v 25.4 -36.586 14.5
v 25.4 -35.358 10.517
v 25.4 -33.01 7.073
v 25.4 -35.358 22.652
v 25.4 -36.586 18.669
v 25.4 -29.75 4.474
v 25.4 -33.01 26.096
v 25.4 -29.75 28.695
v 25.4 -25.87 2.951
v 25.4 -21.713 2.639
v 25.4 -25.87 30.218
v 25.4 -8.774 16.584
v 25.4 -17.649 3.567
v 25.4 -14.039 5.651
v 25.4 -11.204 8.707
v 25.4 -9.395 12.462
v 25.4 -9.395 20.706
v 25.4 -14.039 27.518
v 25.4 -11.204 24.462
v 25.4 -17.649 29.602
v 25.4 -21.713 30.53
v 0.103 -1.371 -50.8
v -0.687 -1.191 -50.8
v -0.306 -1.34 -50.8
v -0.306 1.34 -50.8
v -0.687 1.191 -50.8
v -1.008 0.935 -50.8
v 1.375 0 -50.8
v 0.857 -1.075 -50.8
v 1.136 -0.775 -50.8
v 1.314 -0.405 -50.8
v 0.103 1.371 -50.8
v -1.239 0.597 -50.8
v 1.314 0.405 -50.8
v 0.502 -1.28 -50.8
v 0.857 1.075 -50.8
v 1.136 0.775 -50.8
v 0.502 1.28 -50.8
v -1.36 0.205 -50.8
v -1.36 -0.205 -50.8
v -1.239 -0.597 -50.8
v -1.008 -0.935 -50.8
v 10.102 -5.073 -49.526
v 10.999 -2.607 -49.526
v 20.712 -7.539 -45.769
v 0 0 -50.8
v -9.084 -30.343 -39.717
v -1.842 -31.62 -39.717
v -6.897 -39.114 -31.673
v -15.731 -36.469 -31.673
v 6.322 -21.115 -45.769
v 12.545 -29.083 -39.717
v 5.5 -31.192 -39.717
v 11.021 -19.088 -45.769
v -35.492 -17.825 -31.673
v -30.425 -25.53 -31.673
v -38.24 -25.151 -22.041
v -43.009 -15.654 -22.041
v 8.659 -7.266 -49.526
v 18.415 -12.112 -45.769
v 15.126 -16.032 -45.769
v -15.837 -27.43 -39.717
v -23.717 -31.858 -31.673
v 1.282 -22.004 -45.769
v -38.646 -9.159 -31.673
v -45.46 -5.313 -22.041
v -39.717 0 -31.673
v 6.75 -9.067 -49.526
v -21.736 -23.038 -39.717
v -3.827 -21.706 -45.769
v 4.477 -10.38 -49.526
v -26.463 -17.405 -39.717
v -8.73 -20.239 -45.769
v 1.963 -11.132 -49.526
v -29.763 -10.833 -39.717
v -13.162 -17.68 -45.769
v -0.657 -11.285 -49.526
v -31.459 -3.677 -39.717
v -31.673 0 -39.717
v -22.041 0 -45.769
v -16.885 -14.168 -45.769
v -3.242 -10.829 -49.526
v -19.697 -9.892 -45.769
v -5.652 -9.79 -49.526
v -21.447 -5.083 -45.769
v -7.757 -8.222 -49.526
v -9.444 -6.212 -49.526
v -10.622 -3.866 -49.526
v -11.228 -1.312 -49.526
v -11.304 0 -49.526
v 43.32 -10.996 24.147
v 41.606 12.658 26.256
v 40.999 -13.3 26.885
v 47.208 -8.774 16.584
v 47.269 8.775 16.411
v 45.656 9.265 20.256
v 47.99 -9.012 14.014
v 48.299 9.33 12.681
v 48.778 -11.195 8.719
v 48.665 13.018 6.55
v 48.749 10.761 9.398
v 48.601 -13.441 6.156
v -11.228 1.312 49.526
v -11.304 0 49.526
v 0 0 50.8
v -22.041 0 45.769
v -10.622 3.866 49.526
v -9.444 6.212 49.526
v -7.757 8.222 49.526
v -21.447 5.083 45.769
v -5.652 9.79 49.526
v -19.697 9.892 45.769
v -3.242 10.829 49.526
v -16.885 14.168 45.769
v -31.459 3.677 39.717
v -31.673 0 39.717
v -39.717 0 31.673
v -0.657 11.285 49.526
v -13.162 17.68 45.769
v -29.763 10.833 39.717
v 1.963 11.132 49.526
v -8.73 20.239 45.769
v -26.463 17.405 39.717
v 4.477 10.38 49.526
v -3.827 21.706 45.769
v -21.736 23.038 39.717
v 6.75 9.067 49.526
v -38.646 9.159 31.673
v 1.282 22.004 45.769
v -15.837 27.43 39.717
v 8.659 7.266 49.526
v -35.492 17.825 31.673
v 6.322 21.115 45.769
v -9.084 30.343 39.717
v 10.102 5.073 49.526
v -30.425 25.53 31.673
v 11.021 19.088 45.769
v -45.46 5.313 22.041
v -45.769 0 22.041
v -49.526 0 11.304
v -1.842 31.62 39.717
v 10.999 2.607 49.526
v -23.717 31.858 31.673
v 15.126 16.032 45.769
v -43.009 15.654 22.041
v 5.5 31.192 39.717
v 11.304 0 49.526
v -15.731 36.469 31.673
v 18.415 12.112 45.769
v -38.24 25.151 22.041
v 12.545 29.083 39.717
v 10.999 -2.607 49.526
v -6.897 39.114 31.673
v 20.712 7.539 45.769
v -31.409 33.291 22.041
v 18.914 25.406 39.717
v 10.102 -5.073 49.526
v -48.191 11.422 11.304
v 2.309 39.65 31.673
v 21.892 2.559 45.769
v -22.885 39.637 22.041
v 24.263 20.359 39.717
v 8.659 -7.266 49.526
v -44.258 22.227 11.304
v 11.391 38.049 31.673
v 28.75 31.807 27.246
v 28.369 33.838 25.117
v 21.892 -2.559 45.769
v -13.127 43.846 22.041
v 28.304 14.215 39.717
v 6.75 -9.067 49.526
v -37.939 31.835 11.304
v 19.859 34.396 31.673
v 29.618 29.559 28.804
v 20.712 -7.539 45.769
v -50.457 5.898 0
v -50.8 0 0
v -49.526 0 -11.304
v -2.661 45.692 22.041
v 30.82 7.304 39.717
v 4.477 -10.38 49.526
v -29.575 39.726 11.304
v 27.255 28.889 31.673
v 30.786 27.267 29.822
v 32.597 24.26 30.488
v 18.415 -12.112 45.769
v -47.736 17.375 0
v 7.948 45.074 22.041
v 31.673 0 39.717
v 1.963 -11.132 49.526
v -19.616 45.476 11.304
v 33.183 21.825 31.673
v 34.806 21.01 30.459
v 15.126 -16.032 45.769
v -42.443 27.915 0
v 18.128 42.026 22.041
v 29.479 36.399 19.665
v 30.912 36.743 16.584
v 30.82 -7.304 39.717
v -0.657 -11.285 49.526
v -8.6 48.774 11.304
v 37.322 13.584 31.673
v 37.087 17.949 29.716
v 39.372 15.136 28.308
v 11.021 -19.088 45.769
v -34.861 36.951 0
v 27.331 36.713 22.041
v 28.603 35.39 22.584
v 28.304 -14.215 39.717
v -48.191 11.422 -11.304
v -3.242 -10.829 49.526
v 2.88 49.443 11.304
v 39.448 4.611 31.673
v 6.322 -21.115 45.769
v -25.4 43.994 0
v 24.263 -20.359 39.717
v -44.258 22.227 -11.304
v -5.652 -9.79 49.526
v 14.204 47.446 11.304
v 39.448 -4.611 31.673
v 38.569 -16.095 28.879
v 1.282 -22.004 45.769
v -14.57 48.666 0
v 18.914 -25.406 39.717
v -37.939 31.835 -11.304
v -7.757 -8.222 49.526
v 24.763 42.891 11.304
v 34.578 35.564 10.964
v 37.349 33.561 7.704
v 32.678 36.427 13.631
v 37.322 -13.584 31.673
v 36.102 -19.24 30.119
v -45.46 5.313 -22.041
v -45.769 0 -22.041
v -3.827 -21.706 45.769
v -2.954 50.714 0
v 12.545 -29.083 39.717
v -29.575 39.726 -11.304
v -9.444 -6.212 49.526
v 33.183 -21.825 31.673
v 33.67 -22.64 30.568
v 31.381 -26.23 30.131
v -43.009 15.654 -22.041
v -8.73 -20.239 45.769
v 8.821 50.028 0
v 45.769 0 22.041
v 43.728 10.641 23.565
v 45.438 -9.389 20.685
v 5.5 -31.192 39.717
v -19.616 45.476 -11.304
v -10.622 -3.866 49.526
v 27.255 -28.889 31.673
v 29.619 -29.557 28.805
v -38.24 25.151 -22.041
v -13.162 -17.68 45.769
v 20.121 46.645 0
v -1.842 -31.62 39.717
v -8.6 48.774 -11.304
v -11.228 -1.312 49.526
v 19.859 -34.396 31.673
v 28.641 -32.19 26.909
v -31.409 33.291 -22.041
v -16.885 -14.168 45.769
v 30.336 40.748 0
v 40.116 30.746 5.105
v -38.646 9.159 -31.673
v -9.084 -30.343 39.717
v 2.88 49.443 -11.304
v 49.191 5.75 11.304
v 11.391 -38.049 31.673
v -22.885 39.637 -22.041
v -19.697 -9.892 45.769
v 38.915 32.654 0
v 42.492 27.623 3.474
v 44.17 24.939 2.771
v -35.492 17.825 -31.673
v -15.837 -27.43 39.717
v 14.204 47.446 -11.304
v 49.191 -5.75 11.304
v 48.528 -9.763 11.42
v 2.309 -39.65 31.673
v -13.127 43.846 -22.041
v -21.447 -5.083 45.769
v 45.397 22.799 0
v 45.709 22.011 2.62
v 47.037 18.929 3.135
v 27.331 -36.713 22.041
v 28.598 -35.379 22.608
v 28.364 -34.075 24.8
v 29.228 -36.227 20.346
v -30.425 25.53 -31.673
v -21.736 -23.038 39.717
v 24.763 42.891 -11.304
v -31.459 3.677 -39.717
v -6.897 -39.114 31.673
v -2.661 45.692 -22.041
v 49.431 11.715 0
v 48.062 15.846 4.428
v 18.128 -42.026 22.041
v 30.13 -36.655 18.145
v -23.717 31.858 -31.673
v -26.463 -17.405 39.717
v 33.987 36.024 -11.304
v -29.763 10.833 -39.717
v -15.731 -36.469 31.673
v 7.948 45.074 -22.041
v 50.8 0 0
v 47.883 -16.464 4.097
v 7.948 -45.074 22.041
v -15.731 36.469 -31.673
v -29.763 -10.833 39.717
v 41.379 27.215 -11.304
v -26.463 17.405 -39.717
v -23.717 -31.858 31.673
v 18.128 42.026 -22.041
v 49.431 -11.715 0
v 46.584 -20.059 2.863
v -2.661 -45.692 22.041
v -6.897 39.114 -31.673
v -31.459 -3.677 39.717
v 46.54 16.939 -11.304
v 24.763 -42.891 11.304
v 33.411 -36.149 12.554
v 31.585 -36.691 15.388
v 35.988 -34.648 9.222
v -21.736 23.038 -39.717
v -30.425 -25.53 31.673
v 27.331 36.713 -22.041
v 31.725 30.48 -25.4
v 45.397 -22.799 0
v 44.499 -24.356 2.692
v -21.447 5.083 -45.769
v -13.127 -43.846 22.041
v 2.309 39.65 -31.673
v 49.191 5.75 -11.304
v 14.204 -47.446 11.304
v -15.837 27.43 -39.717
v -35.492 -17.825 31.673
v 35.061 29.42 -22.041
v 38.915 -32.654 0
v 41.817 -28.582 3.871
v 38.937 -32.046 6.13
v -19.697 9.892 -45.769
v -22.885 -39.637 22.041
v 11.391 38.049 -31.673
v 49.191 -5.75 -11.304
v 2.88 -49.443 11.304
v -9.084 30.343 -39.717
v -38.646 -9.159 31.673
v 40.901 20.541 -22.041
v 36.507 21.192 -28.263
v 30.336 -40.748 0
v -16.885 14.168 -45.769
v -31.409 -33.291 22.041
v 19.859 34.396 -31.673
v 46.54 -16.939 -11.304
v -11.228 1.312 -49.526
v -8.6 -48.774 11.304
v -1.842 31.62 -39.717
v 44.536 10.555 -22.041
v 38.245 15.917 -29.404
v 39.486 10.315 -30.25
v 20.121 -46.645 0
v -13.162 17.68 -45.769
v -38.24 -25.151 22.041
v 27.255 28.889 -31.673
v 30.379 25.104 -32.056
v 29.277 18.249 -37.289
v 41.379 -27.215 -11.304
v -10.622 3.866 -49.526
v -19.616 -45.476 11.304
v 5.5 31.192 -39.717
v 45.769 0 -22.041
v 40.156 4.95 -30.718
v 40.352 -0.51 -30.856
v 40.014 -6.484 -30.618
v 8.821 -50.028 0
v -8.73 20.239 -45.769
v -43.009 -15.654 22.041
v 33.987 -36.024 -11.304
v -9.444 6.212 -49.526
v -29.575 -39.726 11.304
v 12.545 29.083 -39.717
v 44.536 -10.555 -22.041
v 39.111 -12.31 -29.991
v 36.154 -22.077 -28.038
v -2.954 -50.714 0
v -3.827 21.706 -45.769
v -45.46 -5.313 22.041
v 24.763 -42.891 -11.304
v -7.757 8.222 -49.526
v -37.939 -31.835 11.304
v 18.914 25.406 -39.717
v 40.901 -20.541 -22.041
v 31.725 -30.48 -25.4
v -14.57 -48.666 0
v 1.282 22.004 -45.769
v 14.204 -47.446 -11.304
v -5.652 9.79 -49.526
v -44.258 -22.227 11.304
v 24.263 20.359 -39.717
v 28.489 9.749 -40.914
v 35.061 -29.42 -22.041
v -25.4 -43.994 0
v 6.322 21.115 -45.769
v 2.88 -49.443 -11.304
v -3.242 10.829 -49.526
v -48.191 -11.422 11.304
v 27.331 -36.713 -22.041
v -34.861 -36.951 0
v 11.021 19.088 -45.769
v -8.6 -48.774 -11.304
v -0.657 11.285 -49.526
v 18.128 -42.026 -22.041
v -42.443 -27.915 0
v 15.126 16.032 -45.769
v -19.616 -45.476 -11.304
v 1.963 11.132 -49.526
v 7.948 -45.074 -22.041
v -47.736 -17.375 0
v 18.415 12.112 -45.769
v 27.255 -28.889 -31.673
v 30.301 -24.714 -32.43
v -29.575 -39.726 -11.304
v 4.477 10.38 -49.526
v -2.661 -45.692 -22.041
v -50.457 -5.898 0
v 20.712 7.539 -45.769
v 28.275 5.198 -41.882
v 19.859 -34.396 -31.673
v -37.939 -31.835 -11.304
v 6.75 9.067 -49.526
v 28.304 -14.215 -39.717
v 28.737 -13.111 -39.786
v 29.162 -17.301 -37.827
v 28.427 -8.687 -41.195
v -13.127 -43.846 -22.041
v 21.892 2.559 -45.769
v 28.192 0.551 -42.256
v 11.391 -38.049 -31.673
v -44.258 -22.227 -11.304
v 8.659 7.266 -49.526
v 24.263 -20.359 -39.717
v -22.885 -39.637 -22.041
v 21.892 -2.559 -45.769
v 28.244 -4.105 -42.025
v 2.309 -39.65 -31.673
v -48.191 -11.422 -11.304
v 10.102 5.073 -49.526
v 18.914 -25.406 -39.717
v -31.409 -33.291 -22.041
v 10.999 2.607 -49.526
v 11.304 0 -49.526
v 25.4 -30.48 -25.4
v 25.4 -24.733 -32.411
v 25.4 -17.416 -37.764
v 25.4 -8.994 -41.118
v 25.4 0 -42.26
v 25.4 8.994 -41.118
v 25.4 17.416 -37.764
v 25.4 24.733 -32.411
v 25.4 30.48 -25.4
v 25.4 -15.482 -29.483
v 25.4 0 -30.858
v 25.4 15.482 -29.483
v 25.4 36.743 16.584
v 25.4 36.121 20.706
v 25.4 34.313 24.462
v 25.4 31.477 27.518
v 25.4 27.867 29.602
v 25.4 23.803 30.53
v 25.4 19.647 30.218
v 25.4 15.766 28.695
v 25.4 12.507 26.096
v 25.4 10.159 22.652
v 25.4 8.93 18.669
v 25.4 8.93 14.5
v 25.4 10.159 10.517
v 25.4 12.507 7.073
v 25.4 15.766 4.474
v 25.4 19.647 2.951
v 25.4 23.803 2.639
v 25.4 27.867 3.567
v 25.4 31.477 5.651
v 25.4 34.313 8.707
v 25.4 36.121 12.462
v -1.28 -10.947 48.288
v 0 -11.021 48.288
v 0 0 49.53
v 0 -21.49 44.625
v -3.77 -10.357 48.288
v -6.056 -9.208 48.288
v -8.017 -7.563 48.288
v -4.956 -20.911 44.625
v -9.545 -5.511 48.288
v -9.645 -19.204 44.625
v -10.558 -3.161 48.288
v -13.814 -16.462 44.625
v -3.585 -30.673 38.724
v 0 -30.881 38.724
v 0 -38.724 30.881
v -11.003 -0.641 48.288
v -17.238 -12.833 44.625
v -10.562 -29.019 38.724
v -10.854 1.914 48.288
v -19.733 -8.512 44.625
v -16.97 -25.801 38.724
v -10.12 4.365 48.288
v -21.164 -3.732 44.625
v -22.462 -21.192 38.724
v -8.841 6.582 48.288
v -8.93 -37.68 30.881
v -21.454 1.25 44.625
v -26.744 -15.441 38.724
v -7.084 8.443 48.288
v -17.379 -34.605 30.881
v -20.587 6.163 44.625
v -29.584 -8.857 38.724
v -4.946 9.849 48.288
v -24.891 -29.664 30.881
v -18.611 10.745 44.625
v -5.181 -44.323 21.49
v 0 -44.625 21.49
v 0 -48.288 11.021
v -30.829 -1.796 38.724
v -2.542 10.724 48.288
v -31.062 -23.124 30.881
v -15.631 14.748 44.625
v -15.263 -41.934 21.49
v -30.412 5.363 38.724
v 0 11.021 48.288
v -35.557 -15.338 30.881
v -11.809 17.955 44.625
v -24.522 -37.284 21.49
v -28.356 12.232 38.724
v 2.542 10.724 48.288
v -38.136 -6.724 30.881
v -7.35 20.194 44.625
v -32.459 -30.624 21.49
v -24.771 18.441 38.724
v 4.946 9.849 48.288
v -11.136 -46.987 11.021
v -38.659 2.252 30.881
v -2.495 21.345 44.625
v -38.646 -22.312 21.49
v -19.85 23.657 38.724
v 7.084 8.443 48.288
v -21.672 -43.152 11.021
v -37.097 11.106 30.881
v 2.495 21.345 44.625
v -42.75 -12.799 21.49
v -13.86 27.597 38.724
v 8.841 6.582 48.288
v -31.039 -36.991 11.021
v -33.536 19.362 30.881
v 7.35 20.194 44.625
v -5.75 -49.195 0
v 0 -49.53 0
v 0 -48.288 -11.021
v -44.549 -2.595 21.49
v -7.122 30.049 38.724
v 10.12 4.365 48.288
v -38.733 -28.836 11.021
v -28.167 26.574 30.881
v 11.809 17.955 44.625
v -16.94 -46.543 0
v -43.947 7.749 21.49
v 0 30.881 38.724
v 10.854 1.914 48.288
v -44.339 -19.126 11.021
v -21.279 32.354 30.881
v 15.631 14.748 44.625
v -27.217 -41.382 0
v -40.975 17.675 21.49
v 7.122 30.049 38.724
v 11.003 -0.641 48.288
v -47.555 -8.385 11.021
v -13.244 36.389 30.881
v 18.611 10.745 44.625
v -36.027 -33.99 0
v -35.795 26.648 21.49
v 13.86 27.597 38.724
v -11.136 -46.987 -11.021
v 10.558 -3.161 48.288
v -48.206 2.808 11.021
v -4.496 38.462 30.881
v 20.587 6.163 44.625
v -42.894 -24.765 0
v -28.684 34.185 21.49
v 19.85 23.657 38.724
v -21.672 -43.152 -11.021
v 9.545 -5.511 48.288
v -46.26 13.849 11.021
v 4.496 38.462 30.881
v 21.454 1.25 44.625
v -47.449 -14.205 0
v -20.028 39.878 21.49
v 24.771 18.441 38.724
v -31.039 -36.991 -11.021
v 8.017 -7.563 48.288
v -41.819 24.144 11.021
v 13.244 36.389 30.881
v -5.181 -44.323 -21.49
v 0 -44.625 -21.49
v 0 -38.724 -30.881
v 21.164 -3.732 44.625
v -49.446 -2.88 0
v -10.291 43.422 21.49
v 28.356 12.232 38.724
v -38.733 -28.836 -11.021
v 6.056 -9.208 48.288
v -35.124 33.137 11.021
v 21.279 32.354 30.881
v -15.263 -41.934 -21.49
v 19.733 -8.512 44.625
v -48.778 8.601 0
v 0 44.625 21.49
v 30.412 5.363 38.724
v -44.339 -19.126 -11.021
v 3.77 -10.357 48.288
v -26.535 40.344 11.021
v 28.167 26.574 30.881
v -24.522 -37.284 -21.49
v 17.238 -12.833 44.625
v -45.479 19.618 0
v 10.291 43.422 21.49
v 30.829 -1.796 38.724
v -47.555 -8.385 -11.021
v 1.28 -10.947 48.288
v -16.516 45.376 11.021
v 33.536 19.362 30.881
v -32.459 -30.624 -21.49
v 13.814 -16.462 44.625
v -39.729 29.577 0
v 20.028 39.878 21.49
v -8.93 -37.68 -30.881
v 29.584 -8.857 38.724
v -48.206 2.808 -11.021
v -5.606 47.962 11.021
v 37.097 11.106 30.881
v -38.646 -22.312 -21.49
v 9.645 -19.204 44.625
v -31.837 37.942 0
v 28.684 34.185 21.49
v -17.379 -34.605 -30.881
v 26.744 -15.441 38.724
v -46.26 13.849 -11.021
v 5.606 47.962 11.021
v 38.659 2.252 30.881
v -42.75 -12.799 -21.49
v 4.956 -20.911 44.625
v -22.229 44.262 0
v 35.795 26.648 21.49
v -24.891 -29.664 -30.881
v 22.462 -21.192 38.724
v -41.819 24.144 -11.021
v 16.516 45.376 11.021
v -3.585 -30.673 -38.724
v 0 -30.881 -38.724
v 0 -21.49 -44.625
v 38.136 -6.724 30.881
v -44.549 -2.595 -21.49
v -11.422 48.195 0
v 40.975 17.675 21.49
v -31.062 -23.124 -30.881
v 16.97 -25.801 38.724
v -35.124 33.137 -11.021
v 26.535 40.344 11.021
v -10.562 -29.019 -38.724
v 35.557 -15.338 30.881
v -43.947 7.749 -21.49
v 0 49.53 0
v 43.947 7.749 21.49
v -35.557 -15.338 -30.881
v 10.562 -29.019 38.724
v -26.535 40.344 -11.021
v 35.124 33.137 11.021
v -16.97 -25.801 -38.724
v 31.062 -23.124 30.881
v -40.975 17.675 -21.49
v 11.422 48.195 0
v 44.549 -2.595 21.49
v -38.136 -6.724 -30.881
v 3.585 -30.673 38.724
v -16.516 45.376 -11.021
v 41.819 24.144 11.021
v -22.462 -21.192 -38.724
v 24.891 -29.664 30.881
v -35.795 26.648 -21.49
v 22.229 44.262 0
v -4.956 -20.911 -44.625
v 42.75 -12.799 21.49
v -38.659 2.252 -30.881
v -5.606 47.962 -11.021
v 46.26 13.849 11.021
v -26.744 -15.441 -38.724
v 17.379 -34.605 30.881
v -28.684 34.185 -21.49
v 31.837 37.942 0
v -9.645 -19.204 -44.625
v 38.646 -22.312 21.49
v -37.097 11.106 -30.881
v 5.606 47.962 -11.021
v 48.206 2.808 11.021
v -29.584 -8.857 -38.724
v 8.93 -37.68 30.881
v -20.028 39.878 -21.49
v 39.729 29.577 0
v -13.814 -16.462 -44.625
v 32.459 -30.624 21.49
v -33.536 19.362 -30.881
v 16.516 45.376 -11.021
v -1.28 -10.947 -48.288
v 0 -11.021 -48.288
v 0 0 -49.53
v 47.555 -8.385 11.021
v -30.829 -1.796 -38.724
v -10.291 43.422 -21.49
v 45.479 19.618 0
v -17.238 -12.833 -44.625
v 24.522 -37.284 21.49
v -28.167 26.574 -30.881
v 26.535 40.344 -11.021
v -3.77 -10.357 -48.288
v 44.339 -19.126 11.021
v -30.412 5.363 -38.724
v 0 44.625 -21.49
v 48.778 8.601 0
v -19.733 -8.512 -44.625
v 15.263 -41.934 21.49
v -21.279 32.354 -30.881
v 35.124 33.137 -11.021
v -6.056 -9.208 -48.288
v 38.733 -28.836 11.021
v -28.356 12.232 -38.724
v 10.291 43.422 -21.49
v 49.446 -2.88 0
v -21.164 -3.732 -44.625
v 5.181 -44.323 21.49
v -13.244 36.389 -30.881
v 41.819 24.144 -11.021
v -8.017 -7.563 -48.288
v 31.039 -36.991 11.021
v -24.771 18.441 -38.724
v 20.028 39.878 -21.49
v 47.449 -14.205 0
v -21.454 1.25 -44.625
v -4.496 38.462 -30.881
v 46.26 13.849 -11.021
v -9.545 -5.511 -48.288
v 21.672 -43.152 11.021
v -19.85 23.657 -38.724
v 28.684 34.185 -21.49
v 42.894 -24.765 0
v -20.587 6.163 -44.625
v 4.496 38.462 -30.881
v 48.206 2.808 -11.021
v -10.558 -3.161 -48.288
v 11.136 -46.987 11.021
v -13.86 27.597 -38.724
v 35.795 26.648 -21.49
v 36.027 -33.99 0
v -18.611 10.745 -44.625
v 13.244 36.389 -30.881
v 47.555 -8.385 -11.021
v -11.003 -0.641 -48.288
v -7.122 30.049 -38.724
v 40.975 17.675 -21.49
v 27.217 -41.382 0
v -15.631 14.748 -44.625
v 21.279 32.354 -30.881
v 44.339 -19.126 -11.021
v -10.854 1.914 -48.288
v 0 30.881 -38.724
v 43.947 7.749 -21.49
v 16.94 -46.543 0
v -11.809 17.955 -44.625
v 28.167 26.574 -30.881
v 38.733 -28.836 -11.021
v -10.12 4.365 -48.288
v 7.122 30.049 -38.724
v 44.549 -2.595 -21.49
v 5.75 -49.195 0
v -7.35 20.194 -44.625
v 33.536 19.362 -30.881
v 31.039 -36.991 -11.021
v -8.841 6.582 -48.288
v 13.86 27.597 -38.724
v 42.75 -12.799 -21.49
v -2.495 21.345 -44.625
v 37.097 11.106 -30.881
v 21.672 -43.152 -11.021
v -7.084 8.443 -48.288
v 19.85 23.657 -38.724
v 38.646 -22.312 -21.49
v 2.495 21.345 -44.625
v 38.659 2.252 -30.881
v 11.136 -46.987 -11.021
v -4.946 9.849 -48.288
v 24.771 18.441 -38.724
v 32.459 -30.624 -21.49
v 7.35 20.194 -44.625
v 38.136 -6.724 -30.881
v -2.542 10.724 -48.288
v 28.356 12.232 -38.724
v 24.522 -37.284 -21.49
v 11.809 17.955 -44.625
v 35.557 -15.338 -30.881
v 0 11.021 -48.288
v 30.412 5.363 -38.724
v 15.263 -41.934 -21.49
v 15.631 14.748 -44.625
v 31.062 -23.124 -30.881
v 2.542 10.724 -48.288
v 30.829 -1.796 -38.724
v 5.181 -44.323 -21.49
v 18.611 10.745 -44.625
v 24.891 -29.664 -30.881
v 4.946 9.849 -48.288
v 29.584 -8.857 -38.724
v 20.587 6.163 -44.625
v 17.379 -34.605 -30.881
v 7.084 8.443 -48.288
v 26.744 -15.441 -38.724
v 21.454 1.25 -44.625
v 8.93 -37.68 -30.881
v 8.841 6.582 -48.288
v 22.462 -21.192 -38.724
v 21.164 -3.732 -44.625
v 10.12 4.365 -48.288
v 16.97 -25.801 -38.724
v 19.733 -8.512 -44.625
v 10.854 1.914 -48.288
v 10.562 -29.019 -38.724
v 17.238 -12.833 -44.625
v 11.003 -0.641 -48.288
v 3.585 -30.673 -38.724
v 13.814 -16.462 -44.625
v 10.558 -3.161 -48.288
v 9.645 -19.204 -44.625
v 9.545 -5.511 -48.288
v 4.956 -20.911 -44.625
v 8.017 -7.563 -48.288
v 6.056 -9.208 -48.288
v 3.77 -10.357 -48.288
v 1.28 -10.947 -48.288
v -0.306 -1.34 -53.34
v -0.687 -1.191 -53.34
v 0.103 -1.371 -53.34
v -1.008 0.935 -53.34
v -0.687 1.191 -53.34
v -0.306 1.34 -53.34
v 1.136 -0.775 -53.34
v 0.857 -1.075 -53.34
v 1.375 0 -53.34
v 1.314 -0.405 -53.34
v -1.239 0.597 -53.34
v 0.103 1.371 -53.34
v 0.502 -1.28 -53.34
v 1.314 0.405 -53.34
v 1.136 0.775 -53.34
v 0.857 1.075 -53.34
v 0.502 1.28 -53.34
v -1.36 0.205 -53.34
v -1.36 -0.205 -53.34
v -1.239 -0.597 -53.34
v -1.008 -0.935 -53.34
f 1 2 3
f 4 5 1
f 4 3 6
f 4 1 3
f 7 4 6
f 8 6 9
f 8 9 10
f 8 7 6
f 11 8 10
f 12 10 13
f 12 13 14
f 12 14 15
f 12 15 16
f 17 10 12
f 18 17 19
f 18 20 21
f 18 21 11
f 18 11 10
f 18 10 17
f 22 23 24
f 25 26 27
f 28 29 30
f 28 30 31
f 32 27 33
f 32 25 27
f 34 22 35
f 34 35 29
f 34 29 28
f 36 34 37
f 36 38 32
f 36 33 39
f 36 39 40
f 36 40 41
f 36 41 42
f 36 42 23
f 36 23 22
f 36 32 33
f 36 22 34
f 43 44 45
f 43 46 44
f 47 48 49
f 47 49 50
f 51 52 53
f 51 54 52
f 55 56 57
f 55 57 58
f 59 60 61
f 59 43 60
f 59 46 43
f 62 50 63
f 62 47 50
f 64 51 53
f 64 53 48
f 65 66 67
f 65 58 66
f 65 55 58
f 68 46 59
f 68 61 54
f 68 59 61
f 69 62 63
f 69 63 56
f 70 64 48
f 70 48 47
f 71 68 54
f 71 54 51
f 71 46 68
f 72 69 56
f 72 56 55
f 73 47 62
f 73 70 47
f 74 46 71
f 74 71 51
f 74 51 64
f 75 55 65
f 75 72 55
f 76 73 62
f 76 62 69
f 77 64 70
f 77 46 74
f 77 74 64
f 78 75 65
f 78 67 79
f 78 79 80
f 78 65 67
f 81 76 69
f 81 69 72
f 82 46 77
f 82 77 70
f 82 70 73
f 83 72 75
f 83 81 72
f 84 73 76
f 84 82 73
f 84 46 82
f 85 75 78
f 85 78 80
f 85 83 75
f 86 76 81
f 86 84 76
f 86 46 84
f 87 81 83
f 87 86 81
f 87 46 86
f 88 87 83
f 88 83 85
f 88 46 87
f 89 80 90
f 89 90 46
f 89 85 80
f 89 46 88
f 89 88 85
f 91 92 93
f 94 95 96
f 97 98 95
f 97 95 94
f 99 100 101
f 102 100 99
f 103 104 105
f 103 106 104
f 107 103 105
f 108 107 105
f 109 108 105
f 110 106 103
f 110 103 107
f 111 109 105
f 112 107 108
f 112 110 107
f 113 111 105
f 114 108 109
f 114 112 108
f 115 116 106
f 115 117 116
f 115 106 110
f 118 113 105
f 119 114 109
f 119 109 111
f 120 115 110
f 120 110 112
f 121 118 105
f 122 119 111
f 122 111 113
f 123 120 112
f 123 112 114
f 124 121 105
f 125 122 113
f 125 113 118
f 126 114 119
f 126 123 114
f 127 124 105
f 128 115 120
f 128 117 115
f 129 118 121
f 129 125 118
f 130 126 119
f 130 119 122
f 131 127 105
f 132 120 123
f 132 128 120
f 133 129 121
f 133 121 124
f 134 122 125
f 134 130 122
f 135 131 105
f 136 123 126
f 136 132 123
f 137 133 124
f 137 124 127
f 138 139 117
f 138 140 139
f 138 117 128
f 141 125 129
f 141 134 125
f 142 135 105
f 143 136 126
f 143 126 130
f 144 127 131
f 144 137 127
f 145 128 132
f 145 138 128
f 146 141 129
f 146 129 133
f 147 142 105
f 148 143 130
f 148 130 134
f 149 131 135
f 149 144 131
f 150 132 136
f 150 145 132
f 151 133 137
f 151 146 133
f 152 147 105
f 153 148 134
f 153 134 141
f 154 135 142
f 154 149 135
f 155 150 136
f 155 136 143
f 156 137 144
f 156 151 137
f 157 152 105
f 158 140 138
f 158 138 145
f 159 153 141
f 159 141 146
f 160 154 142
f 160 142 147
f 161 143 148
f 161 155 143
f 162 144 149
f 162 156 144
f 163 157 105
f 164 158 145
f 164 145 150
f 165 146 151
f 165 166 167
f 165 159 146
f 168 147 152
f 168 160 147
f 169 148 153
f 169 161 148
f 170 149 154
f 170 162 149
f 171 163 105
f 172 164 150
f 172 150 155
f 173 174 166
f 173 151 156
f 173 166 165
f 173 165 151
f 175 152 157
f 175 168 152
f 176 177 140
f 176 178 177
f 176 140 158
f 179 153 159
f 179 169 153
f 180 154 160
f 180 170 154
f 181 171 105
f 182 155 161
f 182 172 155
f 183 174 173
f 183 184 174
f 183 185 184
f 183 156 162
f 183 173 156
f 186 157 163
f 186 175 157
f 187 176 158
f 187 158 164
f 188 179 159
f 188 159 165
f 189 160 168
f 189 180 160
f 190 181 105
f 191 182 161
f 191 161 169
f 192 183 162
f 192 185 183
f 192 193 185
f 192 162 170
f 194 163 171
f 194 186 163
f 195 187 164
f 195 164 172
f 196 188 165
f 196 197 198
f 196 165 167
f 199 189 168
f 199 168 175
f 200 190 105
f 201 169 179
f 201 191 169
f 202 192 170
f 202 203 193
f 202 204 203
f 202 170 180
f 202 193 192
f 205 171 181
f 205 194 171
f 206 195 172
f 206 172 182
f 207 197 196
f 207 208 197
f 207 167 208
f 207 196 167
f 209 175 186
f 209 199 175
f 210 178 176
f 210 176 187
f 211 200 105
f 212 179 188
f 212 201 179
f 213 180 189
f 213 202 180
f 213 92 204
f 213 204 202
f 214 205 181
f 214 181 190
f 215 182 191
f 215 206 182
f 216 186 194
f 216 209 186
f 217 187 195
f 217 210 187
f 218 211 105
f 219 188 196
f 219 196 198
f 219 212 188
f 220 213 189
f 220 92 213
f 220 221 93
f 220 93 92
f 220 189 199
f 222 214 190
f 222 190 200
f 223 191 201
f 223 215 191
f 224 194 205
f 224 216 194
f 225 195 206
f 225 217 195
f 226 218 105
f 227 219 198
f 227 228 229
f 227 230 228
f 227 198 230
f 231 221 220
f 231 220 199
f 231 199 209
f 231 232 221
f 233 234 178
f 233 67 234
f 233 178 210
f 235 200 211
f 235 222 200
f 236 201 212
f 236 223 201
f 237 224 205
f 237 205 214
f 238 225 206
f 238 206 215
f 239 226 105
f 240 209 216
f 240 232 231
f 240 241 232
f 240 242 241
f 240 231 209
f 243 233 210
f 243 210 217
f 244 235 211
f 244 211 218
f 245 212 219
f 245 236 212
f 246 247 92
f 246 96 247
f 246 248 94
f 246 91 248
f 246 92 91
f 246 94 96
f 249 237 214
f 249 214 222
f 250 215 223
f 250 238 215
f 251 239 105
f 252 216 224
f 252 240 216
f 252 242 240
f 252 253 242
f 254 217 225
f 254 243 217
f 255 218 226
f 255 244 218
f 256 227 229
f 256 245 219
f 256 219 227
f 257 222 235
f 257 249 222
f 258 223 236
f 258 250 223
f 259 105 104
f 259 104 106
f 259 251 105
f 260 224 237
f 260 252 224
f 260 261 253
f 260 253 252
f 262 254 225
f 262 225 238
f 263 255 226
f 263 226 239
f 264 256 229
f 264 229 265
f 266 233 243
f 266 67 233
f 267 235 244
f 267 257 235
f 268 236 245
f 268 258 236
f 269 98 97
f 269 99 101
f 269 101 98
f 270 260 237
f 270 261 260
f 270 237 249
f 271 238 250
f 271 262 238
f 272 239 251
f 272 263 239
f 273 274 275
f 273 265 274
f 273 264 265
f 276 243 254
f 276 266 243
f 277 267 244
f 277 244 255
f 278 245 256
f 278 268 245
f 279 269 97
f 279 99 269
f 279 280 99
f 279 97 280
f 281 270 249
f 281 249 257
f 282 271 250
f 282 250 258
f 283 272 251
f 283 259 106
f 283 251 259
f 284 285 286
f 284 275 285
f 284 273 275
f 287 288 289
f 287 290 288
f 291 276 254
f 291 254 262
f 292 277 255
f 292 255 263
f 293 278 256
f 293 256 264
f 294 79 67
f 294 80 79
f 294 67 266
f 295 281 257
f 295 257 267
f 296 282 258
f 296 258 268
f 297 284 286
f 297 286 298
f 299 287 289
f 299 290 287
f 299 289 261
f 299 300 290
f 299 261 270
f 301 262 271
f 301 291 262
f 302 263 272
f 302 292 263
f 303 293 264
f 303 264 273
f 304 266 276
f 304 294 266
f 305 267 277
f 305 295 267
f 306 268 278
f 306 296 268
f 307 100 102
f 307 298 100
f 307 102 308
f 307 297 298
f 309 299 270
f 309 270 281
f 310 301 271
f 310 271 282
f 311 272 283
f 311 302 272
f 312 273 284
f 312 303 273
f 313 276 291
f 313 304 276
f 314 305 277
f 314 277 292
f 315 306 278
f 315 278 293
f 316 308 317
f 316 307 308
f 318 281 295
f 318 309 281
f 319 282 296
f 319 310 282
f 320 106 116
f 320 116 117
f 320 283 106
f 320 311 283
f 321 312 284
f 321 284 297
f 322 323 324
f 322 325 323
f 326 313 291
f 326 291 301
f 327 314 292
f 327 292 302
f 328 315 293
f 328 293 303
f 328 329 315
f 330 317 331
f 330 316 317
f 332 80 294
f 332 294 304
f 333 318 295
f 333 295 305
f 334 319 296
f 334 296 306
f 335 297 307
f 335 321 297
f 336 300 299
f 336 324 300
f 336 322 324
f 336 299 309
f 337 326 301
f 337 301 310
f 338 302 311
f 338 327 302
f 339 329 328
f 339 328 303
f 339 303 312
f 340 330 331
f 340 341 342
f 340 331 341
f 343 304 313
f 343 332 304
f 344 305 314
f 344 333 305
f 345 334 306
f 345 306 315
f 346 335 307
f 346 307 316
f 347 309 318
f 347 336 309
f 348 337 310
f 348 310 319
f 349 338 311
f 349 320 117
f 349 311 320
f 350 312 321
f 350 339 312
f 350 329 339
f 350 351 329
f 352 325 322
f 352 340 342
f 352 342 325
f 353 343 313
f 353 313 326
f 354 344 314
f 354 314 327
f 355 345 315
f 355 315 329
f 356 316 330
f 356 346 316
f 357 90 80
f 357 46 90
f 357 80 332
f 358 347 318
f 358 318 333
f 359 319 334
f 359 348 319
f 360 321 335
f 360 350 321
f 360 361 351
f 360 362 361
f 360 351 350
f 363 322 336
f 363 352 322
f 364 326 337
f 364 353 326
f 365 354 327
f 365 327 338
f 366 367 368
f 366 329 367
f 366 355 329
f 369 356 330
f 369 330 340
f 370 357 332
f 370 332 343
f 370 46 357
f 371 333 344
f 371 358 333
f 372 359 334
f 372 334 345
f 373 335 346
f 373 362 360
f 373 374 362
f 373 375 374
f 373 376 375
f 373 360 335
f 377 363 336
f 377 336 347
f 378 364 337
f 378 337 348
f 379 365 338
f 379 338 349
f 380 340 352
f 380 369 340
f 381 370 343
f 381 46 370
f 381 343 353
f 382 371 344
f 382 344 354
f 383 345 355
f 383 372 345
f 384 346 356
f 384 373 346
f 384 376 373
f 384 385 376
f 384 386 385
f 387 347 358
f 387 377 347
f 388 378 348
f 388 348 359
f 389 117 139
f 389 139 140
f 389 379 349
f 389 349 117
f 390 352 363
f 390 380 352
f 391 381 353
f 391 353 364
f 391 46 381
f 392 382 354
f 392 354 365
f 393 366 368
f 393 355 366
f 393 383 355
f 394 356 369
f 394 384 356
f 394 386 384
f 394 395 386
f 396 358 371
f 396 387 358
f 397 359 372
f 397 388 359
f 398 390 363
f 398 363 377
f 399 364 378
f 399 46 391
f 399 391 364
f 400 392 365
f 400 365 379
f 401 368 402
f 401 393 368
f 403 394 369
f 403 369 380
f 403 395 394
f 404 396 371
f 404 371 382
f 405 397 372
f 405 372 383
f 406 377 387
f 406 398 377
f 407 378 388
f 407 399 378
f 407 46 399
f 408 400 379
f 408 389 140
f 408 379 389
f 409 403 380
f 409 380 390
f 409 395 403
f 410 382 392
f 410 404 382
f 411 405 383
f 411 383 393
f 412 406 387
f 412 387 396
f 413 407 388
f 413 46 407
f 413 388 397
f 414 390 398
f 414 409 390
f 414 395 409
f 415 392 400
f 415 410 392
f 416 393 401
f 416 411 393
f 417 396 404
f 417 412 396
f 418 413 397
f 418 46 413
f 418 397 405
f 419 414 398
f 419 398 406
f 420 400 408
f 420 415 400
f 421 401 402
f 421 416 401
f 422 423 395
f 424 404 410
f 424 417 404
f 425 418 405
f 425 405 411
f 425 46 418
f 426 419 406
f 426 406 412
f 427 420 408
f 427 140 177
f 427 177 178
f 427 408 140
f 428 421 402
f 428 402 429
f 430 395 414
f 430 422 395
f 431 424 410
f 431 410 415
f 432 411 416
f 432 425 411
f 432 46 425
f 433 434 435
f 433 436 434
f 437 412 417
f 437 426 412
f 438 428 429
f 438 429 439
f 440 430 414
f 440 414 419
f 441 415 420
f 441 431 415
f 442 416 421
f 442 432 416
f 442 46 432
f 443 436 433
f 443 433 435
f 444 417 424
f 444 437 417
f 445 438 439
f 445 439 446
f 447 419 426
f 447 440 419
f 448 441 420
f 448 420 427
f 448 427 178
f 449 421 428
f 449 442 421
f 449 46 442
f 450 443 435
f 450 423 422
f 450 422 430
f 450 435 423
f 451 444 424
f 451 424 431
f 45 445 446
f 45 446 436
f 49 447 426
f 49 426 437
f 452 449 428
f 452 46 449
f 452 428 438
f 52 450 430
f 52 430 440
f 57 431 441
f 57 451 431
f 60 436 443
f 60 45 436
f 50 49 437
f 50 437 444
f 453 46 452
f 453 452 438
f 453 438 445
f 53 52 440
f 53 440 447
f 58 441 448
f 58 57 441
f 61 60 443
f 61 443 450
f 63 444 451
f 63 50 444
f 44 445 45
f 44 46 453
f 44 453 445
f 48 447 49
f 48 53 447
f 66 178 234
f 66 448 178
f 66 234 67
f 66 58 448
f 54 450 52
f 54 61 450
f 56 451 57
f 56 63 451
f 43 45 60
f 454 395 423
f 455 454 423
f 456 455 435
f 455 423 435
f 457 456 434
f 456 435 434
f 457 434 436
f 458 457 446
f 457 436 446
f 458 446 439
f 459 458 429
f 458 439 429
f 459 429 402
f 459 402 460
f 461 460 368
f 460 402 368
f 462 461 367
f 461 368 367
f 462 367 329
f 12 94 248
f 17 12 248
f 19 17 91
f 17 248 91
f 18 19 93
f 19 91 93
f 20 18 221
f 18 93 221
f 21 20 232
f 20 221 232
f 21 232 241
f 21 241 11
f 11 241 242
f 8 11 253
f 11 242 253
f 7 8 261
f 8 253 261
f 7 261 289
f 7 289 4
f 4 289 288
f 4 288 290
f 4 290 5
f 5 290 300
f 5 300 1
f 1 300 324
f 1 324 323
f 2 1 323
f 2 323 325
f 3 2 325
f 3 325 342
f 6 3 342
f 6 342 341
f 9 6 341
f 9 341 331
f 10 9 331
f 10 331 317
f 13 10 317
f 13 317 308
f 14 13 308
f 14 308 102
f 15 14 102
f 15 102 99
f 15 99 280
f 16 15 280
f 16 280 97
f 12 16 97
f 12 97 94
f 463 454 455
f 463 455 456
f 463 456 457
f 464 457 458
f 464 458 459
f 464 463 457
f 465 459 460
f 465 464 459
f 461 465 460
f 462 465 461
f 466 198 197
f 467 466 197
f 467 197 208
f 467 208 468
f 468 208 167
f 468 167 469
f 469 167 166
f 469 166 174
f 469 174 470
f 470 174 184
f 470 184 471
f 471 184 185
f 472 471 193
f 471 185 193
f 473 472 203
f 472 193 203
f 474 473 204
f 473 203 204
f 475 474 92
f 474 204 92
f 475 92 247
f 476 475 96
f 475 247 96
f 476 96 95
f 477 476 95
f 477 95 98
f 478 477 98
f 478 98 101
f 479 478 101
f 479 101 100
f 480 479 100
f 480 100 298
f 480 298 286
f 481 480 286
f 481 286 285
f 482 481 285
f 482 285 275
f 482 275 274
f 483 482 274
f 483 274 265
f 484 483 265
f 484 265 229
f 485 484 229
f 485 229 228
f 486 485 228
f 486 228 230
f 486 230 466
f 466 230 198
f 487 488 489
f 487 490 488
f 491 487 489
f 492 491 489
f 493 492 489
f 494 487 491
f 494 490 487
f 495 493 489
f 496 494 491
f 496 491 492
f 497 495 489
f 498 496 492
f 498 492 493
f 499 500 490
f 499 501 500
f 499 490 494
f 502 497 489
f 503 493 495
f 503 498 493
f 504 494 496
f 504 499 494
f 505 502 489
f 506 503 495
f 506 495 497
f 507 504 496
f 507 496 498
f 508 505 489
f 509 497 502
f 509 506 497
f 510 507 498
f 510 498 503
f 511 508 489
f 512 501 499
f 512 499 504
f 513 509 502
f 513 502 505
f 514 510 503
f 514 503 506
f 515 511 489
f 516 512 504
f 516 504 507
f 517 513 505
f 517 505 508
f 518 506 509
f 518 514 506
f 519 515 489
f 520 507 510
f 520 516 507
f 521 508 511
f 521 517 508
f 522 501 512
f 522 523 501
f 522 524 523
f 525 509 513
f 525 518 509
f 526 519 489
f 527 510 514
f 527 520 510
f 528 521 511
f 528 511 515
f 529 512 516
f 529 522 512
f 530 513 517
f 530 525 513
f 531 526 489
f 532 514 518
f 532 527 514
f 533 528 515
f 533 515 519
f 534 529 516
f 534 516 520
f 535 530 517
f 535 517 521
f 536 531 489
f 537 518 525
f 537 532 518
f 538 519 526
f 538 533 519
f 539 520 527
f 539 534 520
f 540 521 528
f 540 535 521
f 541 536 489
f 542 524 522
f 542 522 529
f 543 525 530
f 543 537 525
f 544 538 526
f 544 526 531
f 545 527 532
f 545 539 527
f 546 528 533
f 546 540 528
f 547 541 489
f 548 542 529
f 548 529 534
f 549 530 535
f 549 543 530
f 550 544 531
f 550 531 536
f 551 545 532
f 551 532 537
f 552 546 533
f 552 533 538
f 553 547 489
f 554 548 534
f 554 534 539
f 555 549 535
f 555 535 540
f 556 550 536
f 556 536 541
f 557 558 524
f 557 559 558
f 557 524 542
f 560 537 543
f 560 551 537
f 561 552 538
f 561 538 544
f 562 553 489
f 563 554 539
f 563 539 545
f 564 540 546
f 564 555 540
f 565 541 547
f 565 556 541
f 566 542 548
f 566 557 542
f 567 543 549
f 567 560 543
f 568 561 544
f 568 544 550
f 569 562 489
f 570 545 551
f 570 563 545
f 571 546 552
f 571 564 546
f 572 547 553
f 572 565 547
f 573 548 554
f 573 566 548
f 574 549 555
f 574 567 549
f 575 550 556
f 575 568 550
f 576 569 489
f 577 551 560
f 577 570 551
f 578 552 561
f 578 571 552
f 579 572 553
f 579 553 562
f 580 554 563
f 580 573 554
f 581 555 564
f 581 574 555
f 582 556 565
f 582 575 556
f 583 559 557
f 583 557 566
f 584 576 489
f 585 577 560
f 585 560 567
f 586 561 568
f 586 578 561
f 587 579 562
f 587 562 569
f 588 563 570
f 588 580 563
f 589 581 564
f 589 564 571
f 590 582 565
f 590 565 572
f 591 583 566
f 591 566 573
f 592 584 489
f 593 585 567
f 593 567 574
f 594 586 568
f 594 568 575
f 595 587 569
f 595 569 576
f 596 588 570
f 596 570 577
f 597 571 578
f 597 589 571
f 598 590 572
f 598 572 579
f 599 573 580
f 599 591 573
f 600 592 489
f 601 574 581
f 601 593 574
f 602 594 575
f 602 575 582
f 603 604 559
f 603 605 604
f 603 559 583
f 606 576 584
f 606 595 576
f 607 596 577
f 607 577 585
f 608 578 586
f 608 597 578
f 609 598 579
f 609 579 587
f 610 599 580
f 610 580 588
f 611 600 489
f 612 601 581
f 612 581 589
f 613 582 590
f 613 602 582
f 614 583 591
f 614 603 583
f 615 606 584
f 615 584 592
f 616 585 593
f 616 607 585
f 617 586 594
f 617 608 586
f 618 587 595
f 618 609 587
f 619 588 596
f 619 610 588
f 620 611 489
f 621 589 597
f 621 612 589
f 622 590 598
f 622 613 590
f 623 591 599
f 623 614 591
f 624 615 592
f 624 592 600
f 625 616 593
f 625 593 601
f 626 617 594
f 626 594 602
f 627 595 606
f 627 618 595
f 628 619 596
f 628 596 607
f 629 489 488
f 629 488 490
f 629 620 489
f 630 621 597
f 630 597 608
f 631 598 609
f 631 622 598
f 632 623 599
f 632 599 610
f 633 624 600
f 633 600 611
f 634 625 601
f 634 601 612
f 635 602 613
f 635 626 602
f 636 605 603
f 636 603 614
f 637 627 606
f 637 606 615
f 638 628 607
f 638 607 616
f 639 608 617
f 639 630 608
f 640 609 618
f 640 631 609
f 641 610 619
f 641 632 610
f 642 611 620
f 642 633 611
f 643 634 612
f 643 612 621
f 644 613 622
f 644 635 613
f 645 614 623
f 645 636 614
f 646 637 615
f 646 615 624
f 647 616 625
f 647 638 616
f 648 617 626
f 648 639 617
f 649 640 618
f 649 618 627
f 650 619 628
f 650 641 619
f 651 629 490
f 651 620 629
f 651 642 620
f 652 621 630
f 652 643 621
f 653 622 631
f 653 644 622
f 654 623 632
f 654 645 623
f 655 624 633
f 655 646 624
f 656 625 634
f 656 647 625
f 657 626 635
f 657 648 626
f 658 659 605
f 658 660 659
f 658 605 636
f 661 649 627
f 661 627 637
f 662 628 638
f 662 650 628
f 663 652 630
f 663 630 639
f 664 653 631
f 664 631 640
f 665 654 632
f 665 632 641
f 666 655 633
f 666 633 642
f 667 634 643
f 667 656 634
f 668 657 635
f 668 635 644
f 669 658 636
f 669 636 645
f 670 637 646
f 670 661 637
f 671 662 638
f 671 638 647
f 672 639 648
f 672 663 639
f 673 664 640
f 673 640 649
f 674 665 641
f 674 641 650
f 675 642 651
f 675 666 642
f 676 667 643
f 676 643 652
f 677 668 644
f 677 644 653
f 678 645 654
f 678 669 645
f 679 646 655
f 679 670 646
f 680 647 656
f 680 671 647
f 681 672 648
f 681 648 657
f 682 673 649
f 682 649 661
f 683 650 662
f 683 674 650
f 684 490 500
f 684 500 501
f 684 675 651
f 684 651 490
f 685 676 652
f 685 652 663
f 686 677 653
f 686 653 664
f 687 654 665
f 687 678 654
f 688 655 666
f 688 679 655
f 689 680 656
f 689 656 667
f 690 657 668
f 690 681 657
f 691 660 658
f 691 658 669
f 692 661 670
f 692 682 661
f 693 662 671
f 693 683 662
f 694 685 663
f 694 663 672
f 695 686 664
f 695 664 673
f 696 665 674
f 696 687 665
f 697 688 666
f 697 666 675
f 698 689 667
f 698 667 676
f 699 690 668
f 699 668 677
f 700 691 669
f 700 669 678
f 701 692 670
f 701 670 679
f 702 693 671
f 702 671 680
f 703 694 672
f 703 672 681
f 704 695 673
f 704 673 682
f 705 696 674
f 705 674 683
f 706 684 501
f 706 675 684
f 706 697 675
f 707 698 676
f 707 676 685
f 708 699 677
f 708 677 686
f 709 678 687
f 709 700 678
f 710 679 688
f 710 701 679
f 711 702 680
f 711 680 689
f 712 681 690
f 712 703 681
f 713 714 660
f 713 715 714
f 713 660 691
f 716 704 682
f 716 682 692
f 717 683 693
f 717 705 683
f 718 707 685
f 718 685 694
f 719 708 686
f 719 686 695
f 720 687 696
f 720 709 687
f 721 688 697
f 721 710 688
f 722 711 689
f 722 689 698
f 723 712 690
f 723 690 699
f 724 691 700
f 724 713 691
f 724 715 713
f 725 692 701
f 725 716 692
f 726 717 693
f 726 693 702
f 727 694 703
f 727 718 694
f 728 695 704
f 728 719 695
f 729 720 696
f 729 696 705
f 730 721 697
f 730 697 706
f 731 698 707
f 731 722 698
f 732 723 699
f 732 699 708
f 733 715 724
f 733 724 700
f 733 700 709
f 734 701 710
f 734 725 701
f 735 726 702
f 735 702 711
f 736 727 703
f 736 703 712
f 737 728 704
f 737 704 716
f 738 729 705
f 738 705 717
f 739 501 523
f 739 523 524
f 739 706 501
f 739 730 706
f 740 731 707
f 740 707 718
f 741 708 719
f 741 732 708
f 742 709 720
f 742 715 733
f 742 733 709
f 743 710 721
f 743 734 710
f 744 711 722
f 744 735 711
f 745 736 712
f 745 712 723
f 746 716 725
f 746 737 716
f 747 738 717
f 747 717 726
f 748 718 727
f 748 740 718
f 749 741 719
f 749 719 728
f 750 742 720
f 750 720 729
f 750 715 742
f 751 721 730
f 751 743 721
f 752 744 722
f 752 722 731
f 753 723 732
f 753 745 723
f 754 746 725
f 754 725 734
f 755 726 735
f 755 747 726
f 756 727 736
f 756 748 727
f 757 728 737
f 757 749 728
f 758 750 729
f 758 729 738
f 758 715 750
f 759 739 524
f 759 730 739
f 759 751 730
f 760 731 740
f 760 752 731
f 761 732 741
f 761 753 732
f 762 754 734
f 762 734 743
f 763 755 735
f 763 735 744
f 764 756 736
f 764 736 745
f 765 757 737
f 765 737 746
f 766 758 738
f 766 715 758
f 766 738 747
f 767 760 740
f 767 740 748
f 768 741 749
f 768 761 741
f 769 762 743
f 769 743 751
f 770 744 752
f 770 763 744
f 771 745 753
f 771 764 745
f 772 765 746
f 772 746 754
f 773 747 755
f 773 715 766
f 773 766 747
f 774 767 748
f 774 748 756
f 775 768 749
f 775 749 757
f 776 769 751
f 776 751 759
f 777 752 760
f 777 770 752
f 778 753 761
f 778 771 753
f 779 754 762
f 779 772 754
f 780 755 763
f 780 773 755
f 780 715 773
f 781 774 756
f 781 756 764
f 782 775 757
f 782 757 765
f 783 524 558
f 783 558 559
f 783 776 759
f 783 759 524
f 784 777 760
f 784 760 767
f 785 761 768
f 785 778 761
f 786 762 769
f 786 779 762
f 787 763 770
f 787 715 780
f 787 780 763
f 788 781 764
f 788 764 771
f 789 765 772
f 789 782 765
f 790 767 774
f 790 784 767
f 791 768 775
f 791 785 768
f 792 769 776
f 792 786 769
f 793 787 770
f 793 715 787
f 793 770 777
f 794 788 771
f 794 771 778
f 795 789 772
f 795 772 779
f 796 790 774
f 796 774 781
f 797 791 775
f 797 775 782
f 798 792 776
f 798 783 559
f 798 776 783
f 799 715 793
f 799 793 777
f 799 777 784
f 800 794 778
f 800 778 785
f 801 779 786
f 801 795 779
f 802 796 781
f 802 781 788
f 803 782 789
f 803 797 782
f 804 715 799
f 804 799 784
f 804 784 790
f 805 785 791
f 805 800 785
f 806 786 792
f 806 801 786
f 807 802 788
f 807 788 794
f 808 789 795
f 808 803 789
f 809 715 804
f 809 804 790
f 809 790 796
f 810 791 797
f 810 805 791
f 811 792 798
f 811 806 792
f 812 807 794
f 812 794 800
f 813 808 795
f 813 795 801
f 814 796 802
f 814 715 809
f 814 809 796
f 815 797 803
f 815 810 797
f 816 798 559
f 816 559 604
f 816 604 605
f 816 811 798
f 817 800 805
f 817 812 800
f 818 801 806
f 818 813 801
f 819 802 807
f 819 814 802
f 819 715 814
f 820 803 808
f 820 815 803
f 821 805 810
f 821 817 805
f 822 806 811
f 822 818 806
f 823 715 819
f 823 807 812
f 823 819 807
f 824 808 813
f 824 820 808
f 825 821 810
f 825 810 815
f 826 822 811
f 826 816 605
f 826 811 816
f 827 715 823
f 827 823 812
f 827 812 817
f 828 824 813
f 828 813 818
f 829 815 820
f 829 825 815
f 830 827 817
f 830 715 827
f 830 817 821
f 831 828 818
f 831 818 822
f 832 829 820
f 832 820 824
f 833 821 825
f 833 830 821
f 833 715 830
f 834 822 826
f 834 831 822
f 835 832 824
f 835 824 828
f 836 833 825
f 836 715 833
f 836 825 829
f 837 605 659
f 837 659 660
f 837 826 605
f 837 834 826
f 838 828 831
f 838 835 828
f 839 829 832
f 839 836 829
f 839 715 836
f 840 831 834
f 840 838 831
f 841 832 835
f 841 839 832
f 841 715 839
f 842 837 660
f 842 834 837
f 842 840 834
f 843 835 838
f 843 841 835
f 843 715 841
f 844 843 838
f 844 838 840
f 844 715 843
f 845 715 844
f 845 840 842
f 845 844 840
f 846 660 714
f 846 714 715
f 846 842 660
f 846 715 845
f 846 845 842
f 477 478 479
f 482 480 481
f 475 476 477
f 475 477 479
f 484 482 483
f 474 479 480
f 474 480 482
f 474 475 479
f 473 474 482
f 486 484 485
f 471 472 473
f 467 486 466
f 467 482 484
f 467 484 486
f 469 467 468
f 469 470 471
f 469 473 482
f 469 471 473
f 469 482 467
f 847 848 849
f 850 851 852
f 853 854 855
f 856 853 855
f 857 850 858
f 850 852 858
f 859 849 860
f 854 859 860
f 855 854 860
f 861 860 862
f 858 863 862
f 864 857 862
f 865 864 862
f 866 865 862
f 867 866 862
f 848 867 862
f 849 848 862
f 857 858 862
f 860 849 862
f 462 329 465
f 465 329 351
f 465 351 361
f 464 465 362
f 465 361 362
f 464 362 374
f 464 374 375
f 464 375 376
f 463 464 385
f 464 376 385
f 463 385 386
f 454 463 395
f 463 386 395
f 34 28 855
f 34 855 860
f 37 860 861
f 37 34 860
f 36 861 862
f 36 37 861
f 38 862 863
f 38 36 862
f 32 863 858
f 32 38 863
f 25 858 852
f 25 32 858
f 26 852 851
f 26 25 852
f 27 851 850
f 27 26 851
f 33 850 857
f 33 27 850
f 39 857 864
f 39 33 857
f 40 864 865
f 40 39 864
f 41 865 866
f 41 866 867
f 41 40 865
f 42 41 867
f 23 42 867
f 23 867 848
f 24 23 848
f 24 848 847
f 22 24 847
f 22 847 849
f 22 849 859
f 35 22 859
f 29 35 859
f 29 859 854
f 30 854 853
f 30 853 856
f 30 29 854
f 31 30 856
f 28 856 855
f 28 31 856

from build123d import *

# Parameters (mm, degrees)
F3_R      = 13.98431
F4_DEPTH  = 25.4
F9_R      = 1.374935
F10_DEPTH = 2.54


with BuildPart() as f1:
    # F0 (on Front) → F1 (revolve)
    with BuildSketch(Plane.XZ):
        with BuildLine():
            Line((0, -50.8), (0, 50.8))
            ThreePointArc((0, 50.8), (-50.8, 0), (0, -50.8))
        make_face()
    revolve(axis=Axis((0, 0, 0), (0, 0, -1)))

    # F3 (on offset) → F4 (cut)
    with BuildSketch(Plane.YZ.offset(50.8)):
        with Locations((-22.758303, 16.584305)):
            Circle(F3_R)
        with BuildLine():
            ThreePointArc((30.48, -25.4), (0, -30.857962), (-30.48, -25.4))
            ThreePointArc((-30.48, -25.4), (0, -42.259776), (30.48, -25.4))
        make_face()
        with Locations((22.758303, 16.584305)):
            Circle(F3_R)
    extrude(amount=-F4_DEPTH, mode=Mode.SUBTRACT)


with BuildPart() as f6:
    # F5 (on Right) → F6 (revolve)
    with BuildSketch(Plane.YZ):
        with BuildLine():
            Line((0, -49.53), (0, 49.53))
            ThreePointArc((0, 49.53), (-49.53, 0), (0, -49.53))
        make_face()
    revolve(axis=Axis((0, 0, 0), (0, 0, -1)))


with BuildPart() as f10:
    # F9 (on plane+point) → F10 (new body)
    with BuildSketch(Plane.XY.offset(-50.8)):
        Circle(F9_R)
    extrude(amount=-F10_DEPTH)


solid = Compound([f1.part, f6.part, f10.part])
